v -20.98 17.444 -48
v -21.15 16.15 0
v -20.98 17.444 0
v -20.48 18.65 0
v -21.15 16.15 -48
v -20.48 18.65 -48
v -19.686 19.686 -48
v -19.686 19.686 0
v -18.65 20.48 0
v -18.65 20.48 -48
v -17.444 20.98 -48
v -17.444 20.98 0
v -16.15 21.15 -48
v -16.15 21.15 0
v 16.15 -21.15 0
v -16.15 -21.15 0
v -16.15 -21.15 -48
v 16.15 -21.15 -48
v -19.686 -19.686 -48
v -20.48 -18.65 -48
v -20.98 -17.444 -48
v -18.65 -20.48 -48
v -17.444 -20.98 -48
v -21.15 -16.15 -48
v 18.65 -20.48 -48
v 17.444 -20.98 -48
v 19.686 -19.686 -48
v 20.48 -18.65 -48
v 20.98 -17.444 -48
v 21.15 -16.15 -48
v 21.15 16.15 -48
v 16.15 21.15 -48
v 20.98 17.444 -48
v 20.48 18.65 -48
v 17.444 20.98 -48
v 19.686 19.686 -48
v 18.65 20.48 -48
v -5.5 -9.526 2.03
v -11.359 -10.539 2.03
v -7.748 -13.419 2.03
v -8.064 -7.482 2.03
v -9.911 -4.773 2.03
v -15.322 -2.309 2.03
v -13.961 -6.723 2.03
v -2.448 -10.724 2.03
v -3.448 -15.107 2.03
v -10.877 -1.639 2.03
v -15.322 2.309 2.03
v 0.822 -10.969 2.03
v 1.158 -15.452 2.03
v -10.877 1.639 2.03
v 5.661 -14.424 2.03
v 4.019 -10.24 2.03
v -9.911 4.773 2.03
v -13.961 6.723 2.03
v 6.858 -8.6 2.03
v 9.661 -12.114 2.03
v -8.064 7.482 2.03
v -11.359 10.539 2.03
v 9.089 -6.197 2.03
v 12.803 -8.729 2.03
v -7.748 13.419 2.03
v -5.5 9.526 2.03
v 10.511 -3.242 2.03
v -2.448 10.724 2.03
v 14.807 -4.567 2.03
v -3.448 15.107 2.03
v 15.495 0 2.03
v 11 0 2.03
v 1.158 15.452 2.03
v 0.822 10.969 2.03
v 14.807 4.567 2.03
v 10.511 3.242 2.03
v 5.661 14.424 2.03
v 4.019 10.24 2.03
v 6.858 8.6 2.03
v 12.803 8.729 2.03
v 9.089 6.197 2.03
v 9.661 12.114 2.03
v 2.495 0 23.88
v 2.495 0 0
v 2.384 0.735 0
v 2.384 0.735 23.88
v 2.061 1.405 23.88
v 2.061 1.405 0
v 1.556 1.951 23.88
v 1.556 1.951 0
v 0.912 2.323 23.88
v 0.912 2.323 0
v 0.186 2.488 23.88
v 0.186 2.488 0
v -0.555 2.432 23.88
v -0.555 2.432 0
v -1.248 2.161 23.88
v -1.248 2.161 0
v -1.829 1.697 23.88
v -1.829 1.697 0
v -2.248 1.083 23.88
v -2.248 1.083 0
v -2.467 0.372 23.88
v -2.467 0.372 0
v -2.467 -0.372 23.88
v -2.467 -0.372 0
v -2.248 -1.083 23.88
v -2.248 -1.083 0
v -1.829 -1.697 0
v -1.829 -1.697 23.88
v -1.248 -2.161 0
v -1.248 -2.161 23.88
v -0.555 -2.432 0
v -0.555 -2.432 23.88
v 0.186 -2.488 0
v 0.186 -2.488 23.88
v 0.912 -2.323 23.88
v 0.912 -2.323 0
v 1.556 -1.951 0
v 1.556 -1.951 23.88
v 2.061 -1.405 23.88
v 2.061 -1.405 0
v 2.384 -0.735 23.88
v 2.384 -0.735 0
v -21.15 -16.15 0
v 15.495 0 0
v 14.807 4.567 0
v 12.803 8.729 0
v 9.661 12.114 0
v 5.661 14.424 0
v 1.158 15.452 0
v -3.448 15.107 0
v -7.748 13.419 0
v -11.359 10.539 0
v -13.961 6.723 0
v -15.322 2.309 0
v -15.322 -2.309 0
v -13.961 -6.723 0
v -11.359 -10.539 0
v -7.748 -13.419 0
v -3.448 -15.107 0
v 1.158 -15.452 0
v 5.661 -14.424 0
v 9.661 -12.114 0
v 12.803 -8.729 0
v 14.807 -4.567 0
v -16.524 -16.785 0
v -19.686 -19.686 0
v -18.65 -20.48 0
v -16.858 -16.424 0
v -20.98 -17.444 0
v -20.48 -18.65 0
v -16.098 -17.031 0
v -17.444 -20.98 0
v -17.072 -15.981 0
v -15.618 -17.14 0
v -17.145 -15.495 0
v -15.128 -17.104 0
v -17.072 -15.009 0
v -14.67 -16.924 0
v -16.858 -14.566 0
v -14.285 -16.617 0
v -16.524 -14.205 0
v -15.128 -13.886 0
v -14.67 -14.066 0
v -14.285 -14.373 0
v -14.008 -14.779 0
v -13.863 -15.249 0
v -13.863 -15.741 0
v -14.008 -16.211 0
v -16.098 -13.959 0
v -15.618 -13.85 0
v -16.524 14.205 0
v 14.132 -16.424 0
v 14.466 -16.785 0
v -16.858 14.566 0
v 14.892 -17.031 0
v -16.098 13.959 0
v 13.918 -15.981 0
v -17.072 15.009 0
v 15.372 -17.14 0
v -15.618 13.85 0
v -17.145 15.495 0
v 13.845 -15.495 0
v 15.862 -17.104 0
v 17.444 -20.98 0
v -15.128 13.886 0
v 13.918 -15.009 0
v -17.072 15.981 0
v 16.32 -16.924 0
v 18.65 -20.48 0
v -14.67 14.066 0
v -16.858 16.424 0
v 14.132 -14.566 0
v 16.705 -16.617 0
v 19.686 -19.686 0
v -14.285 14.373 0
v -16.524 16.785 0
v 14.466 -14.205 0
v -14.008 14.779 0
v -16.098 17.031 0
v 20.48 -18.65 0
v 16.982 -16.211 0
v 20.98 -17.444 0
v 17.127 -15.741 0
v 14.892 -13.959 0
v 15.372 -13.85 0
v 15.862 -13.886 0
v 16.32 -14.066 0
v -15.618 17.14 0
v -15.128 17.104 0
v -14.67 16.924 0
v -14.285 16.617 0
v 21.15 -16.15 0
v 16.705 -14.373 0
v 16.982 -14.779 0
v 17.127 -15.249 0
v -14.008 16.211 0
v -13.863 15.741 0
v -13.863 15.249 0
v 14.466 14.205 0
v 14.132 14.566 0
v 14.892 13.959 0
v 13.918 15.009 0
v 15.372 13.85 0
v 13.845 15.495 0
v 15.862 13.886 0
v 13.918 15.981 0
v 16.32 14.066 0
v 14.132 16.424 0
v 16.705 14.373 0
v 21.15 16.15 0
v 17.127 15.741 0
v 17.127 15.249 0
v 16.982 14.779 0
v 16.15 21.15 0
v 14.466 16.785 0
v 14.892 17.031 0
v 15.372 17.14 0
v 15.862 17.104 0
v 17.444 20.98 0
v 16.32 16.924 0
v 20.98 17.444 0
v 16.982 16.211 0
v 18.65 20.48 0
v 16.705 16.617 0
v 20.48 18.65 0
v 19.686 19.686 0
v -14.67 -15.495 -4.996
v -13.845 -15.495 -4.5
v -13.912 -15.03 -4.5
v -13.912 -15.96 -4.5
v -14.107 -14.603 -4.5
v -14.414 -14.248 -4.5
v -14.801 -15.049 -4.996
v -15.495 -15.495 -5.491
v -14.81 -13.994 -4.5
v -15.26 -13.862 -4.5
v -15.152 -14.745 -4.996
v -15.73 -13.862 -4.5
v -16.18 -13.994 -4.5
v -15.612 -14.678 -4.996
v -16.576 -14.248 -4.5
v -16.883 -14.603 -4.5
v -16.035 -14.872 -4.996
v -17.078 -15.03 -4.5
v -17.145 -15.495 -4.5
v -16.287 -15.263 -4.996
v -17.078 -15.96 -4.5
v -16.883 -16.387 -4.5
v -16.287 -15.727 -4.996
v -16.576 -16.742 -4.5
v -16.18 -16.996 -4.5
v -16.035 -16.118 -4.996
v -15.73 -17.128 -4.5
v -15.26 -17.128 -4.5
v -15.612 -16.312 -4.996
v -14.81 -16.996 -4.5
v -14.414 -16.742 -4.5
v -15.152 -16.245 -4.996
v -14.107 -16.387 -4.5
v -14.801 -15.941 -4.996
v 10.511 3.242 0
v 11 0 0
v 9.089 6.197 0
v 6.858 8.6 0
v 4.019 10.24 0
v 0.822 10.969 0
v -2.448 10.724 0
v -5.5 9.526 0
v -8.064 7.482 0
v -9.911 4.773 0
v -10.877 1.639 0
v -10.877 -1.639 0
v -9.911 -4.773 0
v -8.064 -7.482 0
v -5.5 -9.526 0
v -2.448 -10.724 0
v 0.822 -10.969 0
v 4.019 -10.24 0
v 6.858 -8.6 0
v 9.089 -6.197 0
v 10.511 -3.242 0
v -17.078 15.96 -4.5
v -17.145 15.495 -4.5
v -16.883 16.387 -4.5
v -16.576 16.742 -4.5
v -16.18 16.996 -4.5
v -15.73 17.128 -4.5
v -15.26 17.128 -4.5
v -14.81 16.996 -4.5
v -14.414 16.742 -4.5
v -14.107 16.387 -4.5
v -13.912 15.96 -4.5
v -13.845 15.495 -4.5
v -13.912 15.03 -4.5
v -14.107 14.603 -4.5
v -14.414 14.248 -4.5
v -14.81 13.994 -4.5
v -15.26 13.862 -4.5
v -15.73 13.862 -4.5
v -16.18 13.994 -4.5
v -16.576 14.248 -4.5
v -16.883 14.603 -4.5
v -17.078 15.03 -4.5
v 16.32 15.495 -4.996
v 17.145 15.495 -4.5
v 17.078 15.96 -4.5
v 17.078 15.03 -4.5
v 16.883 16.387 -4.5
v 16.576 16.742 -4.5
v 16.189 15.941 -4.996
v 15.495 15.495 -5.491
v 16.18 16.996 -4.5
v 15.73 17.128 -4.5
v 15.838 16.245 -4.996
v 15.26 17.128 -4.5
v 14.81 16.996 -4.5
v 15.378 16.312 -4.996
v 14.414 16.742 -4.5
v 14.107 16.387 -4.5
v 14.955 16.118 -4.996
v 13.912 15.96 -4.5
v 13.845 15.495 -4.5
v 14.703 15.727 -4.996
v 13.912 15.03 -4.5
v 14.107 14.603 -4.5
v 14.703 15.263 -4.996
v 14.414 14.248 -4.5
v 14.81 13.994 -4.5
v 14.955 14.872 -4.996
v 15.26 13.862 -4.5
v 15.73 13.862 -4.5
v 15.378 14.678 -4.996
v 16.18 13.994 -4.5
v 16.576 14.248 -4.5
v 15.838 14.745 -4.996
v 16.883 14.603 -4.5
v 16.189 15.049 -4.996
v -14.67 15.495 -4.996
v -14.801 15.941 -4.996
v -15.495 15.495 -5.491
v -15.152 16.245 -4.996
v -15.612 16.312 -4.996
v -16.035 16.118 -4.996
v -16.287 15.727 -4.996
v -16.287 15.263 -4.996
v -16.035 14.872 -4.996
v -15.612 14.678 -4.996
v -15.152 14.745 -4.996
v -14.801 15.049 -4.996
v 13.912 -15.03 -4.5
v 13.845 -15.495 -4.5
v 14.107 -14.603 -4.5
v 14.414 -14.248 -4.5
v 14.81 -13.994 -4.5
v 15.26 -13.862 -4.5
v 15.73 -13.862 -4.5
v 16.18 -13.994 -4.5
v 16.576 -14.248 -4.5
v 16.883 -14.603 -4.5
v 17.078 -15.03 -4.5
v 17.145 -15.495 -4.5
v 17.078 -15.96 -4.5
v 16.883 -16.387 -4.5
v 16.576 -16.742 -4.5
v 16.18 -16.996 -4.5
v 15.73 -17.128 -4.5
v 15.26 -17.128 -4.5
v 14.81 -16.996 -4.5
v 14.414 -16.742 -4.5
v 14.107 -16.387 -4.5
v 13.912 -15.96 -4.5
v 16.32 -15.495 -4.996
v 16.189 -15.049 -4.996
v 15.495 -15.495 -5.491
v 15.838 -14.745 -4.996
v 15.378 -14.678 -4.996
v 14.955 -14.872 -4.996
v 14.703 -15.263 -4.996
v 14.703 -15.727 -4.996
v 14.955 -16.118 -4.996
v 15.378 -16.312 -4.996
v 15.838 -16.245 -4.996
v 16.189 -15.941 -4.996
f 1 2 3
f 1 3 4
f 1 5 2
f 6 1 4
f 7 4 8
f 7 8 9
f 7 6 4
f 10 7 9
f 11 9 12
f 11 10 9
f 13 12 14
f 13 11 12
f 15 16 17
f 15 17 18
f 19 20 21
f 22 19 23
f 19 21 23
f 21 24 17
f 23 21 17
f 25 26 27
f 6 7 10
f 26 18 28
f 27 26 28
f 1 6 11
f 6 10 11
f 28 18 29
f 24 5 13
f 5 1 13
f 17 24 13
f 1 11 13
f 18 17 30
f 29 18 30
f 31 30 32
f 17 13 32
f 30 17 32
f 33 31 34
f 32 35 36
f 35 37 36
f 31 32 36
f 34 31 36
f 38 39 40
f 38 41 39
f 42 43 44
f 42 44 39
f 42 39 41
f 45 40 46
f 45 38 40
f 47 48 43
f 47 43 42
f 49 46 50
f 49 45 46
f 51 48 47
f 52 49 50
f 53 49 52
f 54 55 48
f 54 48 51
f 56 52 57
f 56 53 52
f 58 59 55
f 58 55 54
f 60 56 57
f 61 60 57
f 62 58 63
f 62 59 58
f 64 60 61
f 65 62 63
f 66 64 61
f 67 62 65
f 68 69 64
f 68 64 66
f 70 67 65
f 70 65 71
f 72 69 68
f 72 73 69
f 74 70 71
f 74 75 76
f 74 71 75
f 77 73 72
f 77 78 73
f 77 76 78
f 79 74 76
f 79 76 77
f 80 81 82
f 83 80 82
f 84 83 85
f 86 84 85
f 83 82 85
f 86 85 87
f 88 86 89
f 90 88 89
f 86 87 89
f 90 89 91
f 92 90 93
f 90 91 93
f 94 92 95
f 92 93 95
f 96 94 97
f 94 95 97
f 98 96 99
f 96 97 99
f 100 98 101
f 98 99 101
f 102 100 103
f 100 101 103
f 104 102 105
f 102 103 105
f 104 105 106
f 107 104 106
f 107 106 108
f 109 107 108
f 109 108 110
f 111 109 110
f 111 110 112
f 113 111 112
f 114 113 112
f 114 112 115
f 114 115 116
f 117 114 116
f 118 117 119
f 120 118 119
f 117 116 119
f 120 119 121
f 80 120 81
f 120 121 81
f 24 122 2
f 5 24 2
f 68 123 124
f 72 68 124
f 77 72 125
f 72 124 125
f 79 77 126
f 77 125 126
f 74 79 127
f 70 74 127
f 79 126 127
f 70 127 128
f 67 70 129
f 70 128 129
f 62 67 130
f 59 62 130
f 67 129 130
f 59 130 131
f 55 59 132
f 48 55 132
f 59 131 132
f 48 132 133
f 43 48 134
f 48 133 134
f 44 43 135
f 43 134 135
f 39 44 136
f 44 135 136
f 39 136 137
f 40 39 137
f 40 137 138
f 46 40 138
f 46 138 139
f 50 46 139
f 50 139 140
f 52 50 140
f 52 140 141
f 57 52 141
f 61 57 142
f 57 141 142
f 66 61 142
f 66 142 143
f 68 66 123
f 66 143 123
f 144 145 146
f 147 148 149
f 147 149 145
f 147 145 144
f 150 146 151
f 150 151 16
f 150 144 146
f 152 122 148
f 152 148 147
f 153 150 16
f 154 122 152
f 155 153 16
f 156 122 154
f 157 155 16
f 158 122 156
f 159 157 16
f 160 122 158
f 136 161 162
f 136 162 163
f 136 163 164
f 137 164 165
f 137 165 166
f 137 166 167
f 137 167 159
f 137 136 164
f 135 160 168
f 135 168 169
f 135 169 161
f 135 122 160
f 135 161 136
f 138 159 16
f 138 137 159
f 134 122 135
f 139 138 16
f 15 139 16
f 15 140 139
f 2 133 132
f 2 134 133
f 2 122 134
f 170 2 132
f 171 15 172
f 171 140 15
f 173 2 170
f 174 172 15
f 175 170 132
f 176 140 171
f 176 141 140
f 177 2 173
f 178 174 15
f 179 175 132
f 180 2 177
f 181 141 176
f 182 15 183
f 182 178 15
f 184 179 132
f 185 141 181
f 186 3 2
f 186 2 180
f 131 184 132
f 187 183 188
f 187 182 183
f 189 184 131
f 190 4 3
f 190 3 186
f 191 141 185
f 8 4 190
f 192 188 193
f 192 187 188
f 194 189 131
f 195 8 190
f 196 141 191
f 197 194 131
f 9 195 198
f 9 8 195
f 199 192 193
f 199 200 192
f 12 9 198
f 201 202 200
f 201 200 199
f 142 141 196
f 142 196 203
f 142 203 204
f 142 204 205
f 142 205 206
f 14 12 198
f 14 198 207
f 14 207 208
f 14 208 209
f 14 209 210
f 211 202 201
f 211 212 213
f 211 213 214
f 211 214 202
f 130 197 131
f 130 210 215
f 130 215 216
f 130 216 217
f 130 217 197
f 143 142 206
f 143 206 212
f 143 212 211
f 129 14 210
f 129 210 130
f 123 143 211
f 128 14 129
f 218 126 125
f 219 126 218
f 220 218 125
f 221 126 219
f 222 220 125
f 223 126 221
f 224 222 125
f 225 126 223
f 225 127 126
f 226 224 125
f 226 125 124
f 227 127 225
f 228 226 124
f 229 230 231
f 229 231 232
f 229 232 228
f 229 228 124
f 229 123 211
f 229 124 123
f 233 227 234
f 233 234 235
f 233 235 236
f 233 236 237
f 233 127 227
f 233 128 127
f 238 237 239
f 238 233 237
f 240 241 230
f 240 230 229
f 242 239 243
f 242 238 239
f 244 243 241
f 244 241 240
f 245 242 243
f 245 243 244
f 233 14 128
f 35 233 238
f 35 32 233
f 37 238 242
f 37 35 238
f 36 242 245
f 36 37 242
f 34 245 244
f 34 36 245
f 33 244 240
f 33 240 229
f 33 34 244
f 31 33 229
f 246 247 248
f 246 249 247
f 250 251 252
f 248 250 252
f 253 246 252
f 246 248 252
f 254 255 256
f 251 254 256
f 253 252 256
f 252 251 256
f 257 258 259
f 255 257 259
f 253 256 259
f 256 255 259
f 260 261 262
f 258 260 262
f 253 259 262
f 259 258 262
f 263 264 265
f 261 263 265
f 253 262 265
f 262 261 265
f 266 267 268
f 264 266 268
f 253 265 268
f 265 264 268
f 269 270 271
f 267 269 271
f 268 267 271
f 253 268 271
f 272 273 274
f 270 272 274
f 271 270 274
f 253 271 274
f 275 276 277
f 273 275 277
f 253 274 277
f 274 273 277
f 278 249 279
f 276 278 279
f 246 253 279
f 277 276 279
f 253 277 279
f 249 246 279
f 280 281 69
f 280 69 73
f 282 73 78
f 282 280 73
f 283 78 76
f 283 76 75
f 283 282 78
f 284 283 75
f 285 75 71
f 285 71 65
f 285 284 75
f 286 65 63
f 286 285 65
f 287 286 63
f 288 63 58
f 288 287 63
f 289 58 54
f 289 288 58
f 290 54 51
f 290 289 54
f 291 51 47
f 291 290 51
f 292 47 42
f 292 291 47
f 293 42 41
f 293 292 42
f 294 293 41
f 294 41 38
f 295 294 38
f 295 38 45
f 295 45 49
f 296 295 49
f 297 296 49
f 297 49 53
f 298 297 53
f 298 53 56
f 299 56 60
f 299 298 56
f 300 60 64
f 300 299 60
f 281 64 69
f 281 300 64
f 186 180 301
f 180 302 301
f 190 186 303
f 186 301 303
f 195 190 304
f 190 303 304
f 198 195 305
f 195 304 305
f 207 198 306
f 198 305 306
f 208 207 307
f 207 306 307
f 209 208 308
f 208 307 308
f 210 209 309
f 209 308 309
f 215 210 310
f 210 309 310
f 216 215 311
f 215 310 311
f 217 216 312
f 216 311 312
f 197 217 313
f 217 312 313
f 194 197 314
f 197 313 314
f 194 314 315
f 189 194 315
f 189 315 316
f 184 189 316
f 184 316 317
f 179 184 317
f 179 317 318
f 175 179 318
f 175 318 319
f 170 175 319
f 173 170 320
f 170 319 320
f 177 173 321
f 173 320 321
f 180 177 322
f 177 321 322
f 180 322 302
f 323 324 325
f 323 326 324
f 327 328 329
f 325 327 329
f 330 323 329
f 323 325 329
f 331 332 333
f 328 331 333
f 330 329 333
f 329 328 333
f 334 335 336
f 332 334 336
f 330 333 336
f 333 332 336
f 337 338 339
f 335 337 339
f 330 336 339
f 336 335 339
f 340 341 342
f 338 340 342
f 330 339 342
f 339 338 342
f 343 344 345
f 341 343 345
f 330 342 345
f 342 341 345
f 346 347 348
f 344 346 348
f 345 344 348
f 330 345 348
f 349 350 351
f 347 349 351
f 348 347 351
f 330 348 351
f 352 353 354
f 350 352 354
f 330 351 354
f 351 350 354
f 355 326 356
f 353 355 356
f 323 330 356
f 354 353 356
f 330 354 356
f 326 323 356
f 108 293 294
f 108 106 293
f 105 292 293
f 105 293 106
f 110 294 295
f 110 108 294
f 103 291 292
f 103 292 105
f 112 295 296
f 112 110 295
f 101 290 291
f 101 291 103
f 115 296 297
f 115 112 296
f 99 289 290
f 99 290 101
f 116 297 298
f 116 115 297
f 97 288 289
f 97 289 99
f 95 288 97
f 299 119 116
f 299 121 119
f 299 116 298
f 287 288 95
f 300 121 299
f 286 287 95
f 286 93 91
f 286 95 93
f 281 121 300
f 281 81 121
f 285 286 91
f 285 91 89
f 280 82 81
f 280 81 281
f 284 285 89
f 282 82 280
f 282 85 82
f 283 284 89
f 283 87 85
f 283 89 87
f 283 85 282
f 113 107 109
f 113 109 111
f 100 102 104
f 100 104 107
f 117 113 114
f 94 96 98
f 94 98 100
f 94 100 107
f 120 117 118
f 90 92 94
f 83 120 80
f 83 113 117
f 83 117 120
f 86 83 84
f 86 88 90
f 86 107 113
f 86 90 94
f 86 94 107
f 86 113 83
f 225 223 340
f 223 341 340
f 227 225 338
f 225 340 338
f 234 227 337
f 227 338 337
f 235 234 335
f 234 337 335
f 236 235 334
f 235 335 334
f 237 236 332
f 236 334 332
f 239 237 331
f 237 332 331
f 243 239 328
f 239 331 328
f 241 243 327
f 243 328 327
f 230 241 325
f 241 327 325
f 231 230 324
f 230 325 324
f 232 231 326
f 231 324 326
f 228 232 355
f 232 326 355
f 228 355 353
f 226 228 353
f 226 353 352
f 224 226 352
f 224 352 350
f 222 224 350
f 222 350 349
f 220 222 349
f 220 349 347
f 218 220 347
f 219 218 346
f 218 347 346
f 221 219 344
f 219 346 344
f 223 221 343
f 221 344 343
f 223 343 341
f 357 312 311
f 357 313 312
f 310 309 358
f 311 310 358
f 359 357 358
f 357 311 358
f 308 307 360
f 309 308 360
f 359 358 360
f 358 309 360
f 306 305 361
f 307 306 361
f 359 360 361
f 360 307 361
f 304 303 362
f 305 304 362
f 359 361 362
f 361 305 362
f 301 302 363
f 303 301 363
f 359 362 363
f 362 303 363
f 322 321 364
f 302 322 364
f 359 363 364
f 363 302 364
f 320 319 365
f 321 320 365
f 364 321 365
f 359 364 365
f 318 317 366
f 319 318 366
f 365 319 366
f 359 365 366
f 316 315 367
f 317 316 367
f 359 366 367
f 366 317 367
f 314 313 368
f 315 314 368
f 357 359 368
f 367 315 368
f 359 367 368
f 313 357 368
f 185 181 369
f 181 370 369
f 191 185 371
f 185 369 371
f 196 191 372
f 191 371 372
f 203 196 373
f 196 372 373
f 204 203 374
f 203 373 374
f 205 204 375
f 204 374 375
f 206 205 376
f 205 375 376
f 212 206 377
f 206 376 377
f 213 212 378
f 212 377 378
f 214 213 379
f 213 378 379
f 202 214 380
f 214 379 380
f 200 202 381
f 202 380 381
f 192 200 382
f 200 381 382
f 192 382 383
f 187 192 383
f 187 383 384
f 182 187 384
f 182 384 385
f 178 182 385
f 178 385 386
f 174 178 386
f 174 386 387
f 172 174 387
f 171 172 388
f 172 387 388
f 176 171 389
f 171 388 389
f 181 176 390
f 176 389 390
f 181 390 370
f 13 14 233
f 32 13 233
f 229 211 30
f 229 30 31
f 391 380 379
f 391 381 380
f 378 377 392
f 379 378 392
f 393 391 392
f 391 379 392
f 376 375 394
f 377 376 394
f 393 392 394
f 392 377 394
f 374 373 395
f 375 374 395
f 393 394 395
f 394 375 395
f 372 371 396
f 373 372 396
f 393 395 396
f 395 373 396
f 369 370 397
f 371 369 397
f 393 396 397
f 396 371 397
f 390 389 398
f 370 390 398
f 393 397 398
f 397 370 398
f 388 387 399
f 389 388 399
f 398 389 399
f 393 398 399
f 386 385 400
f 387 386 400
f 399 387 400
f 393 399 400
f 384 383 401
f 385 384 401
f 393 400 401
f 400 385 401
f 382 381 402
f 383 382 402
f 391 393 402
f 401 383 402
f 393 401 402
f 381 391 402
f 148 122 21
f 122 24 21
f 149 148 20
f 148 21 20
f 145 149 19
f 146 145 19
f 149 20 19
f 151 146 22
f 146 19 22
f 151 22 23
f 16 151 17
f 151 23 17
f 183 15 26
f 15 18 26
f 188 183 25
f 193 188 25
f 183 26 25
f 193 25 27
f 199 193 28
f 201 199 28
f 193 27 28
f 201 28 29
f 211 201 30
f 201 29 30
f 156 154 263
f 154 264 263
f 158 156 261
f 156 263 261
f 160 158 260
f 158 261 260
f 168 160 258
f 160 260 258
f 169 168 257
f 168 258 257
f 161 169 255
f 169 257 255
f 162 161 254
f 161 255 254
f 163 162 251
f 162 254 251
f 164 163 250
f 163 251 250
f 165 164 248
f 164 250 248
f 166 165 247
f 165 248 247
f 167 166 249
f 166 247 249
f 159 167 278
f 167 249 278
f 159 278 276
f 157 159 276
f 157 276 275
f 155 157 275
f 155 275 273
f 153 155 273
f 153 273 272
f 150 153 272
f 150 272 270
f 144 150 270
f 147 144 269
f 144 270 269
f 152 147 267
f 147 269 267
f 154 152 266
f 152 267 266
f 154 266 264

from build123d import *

# Parameters (mm, degrees)
F0_W     = 42.3
F0_H     = 42.3
F1_DEPTH = 48
F2_D     = 3.3
F2_DEPTH = 4.5
F2_TIP   = 0.9914200214
F3_R     = 5
F4_R     = 15.495
F4_R_2   = 11
F5_DEPTH = 2.03
F6_R     = 2.495
F7_DEPTH = 23.88


with BuildPart() as f1:
    # F0 (on Top) → F1 (new body)
    with BuildSketch(Plane.XY):
        Rectangle(F0_W, F0_H)
    extrude(amount=-F1_DEPTH)

    # F2
    with Locations(Plane.XY):
        with Locations((-15.495, 15.495), (-15.495, -15.495), (15.495, -15.495), (15.495, 15.495)):
            Hole(F2_D / 2, depth=F2_DEPTH)
            with Locations((0, 0, -(F2_DEPTH + F2_TIP / 2))):  # 118° drill point
                Cone(0, F2_D / 2, F2_TIP, mode=Mode.SUBTRACT)

    # F3
    f3_edges = [f1.edges().sort_by_distance(p)[0] for p in [
        (-21.15, 21.15, -24),
        (-21.15, -21.15, -24),
        (21.15, -21.15, -24),
        (21.15, 21.15, -24),
    ]]
    fillet(f3_edges, radius=F3_R)

    # F4 (on face) → F5 (join)
    with BuildSketch(Plane.XY):
        Circle(F4_R)
        Circle(F4_R_2, mode=Mode.SUBTRACT)
    extrude(amount=F5_DEPTH)

    # F6 (on face) → F7 (join)
    with BuildSketch(Plane.XY):
        Circle(F6_R)
    extrude(amount=F7_DEPTH)


solid = f1.part
